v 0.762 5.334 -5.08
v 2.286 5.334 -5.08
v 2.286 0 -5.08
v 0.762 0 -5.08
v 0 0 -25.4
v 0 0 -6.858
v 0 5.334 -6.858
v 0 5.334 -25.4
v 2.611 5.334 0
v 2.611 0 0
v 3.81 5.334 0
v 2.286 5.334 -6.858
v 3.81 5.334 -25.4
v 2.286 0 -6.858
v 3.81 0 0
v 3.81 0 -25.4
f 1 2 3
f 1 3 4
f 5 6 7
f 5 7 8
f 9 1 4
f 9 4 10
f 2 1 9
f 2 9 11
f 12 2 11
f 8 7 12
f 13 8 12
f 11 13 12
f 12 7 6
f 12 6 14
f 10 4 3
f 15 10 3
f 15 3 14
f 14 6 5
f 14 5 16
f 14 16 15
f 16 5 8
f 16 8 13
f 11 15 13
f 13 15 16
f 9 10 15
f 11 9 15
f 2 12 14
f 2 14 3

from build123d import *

# Parameters (mm, degrees)
SKETCH2_W           = 3.81
SKETCH2_H           = 25.4
BOSS_EXTRUDE1_DEPTH = 5.334
SKETCH3_OUTSIDE_W   = 11.056
SKETCH3_OUTSIDE_H   = 32.646
CUT_EXTRUDE1_DEPTH  = 27.232187404


with BuildPart() as part:
    # Sketch2 → Boss-Extrude1 (new body)
    with BuildSketch(Plane(origin=(0, 0, 0), x_dir=(1, 0, 0), z_dir=(0, 1, 0))):
        with Locations((1.905, 12.7)):
            Rectangle(SKETCH2_W, SKETCH2_H)
    extrude(amount=BOSS_EXTRUDE1_DEPTH)

    # Sketch3 outside → Cut-Extrude1 (cut, through all)
    with BuildSketch(Plane(origin=(0, 5.334, 0), x_dir=(1, 0, 0), z_dir=(0, 1, 0))):
        with Locations((1.905, 12.7)):
            Rectangle(SKETCH3_OUTSIDE_W, SKETCH3_OUTSIDE_H)
        Polygon((0.762, 5.08), (2.61096879, 0), (3.81, 0), (3.81, 25.4), (0, 25.4), (0, 6.858), (2.286, 6.858), (2.286, 5.08), align=None, mode=Mode.SUBTRACT)
    extrude(amount=-CUT_EXTRUDE1_DEPTH, mode=Mode.SUBTRACT)


solid = part.part
